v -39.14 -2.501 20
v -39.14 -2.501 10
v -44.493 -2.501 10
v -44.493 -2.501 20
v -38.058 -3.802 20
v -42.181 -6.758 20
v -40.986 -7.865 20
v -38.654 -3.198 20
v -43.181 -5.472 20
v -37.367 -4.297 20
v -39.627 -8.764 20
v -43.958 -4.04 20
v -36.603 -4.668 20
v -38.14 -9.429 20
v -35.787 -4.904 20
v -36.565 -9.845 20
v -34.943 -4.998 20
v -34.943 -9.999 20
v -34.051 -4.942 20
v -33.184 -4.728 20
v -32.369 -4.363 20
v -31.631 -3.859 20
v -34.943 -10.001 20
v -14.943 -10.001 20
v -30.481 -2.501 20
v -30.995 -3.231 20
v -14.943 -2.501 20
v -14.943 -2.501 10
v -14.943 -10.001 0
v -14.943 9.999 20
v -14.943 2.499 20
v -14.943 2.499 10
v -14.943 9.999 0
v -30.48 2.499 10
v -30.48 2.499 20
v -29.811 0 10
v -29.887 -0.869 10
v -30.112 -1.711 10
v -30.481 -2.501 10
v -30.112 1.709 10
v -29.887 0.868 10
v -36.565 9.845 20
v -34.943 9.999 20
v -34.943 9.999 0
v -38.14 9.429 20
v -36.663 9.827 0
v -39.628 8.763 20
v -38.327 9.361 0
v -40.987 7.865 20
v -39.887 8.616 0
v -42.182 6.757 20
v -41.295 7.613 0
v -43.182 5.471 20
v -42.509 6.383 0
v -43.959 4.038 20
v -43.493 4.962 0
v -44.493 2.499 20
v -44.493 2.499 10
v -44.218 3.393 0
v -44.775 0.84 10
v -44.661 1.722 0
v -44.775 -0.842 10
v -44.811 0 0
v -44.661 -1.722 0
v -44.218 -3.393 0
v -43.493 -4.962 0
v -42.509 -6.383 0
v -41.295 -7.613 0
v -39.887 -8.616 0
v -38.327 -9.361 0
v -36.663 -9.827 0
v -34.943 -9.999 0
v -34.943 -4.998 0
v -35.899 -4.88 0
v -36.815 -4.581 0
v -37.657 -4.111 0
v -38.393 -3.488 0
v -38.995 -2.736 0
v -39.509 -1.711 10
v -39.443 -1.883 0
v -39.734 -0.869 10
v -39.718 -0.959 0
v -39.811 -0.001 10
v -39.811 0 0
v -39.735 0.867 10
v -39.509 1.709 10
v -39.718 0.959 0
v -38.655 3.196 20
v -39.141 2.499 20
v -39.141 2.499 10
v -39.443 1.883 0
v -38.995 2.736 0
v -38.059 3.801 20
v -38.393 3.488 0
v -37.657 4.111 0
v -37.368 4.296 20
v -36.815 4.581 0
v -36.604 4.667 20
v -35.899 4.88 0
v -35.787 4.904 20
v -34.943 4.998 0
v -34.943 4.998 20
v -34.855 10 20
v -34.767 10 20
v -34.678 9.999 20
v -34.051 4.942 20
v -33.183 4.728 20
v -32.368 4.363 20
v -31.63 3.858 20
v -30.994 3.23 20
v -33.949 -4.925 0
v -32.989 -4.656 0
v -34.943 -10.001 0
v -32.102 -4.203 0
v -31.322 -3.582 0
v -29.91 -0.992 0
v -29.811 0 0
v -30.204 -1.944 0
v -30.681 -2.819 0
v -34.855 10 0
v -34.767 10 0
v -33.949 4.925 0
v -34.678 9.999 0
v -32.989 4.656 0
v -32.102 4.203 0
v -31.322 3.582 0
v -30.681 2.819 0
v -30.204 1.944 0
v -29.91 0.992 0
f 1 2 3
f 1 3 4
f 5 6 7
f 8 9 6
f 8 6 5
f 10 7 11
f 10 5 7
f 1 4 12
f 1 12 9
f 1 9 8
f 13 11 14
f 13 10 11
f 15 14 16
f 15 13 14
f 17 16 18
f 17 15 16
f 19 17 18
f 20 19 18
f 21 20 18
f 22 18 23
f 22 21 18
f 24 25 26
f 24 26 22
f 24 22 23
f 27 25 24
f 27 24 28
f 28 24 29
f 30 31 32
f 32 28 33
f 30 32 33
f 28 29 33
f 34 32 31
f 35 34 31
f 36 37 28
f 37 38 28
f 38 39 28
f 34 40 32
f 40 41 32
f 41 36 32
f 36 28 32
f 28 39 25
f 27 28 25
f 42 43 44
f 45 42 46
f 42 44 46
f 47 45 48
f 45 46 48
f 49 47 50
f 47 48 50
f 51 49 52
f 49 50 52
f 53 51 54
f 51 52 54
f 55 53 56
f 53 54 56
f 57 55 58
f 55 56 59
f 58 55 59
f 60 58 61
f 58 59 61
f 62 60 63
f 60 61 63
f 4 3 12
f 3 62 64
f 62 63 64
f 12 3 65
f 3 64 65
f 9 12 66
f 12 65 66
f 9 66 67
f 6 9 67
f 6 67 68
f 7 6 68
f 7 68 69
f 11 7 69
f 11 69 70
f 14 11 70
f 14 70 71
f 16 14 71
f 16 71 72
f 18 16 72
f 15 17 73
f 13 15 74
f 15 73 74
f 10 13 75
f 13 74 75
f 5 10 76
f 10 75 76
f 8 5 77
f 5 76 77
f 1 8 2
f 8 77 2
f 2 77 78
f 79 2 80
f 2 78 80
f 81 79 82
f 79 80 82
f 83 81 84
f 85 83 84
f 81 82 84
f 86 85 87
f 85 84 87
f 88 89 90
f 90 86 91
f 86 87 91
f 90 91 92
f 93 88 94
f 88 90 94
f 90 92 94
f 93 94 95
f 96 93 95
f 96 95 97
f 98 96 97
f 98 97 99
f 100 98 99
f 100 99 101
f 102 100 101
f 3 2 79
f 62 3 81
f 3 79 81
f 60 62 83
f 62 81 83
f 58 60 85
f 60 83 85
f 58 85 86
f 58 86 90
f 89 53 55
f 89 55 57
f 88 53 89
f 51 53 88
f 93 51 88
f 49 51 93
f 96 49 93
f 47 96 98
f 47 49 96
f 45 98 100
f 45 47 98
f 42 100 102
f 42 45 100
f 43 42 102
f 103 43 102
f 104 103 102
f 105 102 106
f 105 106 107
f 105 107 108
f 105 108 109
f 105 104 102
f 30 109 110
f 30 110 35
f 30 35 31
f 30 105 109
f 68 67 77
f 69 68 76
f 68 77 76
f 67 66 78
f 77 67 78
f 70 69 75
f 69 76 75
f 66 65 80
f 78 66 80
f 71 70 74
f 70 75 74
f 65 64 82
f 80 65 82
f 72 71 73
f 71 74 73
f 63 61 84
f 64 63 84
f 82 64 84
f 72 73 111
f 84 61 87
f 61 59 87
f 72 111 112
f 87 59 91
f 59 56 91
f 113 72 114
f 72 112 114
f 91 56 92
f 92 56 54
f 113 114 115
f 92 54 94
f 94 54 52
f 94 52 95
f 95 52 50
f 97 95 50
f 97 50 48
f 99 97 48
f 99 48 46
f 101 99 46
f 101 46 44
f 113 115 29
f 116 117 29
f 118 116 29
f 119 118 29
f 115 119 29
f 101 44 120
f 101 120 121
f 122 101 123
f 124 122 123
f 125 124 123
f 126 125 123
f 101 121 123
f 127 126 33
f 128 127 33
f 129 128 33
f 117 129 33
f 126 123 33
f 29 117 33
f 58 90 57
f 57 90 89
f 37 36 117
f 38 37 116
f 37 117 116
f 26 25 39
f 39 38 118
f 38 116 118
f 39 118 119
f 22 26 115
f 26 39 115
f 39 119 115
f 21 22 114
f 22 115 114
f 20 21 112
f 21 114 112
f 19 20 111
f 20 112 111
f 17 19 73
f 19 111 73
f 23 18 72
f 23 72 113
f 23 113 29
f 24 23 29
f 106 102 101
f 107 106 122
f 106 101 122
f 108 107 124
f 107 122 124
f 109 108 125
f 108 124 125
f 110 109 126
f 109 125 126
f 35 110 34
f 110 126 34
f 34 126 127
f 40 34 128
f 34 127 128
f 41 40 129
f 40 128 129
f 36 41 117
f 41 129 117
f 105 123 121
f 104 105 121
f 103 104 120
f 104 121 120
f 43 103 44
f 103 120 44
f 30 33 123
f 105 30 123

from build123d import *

# Parameters (mm, degrees)
F1_DEPTH = 20
F2_W     = 5
F2_H     = 10
F3_DEPTH = 29.868809509


with BuildPart() as f1:
    # F0 (on Top) → F1 (new body)
    with BuildSketch(Plane.XY):
        with BuildLine():
            ThreePointArc((-34.9428019347, -9.9991262455), (-27.7864355102, -7.117650768), (-24.8106114437, 0))
            ThreePointArc((-24.8106114437, 0), (-27.6929606757, 7.0241759335), (-34.6784209527, 9.9991262455))
            Line((-34.6784209527, 9.9991262455), (-34.9428019347, 9.9991262455))
            Line((-34.9428019347, 9.9991262455), (-34.9428019347, 4.998252262))
            ThreePointArc((-34.9428019347, 4.998252262), (-31.3221269916, 3.581965414), (-29.8106114437, 0))
            ThreePointArc((-29.8106114437, 0), (-31.3221269916, -3.581965414), (-34.9428019347, -4.998252262))
            Line((-34.9428019347, -4.998252262), (-34.9428019347, -9.9991262455))
        make_face()
        with BuildLine():
            ThreePointArc((-34.6784209527, 9.9991262455), (-27.6929606757, 7.0241759335), (-24.8106114437, 0))
            ThreePointArc((-24.8106114437, 0), (-27.7864355102, -7.117650768), (-34.9428019347, -9.9991262455))
            Line((-34.9428019347, -9.9991262455), (-34.9428019347, -10.0008737545))
            Line((-34.9428019347, -10.0008737545), (-14.9428019347, -10.0008737545))
            Line((-14.9428019347, -10.0008737545), (-14.9428019347, 9.9991262455))
            Line((-14.9428019347, 9.9991262455), (-34.6784209527, 9.9991262455))
        make_face()
        with BuildLine():
            Line((-34.9428019347, 9.9991262455), (-34.6784209527, 9.9991262455))
            ThreePointArc((-34.6784209527, 9.9991262455), (-34.8106114437, 10), (-34.9428019347, 9.9991262455))
        make_face()
        with BuildLine():
            ThreePointArc((-34.9428019347, 9.9991262455), (-44.8106114437, 0), (-34.9428019347, -9.9991262455))
            Line((-34.9428019347, -9.9991262455), (-34.9428019347, -4.998252262))
            ThreePointArc((-34.9428019347, -4.998252262), (-39.8106114437, 0), (-34.9428019347, 4.998252262))
            Line((-34.9428019347, 4.998252262), (-34.9428019347, 9.9991262455))
        make_face()
    extrude(amount=F1_DEPTH)

    # F2 (on face) → F3 (cut, through all)
    with BuildSketch(Plane.YZ.offset(-14.9428019347)):
        with Locations((-0.0008737545, 15)):
            Rectangle(F2_W, F2_H)
    extrude(amount=-F3_DEPTH, mode=Mode.SUBTRACT)


solid = f1.part
